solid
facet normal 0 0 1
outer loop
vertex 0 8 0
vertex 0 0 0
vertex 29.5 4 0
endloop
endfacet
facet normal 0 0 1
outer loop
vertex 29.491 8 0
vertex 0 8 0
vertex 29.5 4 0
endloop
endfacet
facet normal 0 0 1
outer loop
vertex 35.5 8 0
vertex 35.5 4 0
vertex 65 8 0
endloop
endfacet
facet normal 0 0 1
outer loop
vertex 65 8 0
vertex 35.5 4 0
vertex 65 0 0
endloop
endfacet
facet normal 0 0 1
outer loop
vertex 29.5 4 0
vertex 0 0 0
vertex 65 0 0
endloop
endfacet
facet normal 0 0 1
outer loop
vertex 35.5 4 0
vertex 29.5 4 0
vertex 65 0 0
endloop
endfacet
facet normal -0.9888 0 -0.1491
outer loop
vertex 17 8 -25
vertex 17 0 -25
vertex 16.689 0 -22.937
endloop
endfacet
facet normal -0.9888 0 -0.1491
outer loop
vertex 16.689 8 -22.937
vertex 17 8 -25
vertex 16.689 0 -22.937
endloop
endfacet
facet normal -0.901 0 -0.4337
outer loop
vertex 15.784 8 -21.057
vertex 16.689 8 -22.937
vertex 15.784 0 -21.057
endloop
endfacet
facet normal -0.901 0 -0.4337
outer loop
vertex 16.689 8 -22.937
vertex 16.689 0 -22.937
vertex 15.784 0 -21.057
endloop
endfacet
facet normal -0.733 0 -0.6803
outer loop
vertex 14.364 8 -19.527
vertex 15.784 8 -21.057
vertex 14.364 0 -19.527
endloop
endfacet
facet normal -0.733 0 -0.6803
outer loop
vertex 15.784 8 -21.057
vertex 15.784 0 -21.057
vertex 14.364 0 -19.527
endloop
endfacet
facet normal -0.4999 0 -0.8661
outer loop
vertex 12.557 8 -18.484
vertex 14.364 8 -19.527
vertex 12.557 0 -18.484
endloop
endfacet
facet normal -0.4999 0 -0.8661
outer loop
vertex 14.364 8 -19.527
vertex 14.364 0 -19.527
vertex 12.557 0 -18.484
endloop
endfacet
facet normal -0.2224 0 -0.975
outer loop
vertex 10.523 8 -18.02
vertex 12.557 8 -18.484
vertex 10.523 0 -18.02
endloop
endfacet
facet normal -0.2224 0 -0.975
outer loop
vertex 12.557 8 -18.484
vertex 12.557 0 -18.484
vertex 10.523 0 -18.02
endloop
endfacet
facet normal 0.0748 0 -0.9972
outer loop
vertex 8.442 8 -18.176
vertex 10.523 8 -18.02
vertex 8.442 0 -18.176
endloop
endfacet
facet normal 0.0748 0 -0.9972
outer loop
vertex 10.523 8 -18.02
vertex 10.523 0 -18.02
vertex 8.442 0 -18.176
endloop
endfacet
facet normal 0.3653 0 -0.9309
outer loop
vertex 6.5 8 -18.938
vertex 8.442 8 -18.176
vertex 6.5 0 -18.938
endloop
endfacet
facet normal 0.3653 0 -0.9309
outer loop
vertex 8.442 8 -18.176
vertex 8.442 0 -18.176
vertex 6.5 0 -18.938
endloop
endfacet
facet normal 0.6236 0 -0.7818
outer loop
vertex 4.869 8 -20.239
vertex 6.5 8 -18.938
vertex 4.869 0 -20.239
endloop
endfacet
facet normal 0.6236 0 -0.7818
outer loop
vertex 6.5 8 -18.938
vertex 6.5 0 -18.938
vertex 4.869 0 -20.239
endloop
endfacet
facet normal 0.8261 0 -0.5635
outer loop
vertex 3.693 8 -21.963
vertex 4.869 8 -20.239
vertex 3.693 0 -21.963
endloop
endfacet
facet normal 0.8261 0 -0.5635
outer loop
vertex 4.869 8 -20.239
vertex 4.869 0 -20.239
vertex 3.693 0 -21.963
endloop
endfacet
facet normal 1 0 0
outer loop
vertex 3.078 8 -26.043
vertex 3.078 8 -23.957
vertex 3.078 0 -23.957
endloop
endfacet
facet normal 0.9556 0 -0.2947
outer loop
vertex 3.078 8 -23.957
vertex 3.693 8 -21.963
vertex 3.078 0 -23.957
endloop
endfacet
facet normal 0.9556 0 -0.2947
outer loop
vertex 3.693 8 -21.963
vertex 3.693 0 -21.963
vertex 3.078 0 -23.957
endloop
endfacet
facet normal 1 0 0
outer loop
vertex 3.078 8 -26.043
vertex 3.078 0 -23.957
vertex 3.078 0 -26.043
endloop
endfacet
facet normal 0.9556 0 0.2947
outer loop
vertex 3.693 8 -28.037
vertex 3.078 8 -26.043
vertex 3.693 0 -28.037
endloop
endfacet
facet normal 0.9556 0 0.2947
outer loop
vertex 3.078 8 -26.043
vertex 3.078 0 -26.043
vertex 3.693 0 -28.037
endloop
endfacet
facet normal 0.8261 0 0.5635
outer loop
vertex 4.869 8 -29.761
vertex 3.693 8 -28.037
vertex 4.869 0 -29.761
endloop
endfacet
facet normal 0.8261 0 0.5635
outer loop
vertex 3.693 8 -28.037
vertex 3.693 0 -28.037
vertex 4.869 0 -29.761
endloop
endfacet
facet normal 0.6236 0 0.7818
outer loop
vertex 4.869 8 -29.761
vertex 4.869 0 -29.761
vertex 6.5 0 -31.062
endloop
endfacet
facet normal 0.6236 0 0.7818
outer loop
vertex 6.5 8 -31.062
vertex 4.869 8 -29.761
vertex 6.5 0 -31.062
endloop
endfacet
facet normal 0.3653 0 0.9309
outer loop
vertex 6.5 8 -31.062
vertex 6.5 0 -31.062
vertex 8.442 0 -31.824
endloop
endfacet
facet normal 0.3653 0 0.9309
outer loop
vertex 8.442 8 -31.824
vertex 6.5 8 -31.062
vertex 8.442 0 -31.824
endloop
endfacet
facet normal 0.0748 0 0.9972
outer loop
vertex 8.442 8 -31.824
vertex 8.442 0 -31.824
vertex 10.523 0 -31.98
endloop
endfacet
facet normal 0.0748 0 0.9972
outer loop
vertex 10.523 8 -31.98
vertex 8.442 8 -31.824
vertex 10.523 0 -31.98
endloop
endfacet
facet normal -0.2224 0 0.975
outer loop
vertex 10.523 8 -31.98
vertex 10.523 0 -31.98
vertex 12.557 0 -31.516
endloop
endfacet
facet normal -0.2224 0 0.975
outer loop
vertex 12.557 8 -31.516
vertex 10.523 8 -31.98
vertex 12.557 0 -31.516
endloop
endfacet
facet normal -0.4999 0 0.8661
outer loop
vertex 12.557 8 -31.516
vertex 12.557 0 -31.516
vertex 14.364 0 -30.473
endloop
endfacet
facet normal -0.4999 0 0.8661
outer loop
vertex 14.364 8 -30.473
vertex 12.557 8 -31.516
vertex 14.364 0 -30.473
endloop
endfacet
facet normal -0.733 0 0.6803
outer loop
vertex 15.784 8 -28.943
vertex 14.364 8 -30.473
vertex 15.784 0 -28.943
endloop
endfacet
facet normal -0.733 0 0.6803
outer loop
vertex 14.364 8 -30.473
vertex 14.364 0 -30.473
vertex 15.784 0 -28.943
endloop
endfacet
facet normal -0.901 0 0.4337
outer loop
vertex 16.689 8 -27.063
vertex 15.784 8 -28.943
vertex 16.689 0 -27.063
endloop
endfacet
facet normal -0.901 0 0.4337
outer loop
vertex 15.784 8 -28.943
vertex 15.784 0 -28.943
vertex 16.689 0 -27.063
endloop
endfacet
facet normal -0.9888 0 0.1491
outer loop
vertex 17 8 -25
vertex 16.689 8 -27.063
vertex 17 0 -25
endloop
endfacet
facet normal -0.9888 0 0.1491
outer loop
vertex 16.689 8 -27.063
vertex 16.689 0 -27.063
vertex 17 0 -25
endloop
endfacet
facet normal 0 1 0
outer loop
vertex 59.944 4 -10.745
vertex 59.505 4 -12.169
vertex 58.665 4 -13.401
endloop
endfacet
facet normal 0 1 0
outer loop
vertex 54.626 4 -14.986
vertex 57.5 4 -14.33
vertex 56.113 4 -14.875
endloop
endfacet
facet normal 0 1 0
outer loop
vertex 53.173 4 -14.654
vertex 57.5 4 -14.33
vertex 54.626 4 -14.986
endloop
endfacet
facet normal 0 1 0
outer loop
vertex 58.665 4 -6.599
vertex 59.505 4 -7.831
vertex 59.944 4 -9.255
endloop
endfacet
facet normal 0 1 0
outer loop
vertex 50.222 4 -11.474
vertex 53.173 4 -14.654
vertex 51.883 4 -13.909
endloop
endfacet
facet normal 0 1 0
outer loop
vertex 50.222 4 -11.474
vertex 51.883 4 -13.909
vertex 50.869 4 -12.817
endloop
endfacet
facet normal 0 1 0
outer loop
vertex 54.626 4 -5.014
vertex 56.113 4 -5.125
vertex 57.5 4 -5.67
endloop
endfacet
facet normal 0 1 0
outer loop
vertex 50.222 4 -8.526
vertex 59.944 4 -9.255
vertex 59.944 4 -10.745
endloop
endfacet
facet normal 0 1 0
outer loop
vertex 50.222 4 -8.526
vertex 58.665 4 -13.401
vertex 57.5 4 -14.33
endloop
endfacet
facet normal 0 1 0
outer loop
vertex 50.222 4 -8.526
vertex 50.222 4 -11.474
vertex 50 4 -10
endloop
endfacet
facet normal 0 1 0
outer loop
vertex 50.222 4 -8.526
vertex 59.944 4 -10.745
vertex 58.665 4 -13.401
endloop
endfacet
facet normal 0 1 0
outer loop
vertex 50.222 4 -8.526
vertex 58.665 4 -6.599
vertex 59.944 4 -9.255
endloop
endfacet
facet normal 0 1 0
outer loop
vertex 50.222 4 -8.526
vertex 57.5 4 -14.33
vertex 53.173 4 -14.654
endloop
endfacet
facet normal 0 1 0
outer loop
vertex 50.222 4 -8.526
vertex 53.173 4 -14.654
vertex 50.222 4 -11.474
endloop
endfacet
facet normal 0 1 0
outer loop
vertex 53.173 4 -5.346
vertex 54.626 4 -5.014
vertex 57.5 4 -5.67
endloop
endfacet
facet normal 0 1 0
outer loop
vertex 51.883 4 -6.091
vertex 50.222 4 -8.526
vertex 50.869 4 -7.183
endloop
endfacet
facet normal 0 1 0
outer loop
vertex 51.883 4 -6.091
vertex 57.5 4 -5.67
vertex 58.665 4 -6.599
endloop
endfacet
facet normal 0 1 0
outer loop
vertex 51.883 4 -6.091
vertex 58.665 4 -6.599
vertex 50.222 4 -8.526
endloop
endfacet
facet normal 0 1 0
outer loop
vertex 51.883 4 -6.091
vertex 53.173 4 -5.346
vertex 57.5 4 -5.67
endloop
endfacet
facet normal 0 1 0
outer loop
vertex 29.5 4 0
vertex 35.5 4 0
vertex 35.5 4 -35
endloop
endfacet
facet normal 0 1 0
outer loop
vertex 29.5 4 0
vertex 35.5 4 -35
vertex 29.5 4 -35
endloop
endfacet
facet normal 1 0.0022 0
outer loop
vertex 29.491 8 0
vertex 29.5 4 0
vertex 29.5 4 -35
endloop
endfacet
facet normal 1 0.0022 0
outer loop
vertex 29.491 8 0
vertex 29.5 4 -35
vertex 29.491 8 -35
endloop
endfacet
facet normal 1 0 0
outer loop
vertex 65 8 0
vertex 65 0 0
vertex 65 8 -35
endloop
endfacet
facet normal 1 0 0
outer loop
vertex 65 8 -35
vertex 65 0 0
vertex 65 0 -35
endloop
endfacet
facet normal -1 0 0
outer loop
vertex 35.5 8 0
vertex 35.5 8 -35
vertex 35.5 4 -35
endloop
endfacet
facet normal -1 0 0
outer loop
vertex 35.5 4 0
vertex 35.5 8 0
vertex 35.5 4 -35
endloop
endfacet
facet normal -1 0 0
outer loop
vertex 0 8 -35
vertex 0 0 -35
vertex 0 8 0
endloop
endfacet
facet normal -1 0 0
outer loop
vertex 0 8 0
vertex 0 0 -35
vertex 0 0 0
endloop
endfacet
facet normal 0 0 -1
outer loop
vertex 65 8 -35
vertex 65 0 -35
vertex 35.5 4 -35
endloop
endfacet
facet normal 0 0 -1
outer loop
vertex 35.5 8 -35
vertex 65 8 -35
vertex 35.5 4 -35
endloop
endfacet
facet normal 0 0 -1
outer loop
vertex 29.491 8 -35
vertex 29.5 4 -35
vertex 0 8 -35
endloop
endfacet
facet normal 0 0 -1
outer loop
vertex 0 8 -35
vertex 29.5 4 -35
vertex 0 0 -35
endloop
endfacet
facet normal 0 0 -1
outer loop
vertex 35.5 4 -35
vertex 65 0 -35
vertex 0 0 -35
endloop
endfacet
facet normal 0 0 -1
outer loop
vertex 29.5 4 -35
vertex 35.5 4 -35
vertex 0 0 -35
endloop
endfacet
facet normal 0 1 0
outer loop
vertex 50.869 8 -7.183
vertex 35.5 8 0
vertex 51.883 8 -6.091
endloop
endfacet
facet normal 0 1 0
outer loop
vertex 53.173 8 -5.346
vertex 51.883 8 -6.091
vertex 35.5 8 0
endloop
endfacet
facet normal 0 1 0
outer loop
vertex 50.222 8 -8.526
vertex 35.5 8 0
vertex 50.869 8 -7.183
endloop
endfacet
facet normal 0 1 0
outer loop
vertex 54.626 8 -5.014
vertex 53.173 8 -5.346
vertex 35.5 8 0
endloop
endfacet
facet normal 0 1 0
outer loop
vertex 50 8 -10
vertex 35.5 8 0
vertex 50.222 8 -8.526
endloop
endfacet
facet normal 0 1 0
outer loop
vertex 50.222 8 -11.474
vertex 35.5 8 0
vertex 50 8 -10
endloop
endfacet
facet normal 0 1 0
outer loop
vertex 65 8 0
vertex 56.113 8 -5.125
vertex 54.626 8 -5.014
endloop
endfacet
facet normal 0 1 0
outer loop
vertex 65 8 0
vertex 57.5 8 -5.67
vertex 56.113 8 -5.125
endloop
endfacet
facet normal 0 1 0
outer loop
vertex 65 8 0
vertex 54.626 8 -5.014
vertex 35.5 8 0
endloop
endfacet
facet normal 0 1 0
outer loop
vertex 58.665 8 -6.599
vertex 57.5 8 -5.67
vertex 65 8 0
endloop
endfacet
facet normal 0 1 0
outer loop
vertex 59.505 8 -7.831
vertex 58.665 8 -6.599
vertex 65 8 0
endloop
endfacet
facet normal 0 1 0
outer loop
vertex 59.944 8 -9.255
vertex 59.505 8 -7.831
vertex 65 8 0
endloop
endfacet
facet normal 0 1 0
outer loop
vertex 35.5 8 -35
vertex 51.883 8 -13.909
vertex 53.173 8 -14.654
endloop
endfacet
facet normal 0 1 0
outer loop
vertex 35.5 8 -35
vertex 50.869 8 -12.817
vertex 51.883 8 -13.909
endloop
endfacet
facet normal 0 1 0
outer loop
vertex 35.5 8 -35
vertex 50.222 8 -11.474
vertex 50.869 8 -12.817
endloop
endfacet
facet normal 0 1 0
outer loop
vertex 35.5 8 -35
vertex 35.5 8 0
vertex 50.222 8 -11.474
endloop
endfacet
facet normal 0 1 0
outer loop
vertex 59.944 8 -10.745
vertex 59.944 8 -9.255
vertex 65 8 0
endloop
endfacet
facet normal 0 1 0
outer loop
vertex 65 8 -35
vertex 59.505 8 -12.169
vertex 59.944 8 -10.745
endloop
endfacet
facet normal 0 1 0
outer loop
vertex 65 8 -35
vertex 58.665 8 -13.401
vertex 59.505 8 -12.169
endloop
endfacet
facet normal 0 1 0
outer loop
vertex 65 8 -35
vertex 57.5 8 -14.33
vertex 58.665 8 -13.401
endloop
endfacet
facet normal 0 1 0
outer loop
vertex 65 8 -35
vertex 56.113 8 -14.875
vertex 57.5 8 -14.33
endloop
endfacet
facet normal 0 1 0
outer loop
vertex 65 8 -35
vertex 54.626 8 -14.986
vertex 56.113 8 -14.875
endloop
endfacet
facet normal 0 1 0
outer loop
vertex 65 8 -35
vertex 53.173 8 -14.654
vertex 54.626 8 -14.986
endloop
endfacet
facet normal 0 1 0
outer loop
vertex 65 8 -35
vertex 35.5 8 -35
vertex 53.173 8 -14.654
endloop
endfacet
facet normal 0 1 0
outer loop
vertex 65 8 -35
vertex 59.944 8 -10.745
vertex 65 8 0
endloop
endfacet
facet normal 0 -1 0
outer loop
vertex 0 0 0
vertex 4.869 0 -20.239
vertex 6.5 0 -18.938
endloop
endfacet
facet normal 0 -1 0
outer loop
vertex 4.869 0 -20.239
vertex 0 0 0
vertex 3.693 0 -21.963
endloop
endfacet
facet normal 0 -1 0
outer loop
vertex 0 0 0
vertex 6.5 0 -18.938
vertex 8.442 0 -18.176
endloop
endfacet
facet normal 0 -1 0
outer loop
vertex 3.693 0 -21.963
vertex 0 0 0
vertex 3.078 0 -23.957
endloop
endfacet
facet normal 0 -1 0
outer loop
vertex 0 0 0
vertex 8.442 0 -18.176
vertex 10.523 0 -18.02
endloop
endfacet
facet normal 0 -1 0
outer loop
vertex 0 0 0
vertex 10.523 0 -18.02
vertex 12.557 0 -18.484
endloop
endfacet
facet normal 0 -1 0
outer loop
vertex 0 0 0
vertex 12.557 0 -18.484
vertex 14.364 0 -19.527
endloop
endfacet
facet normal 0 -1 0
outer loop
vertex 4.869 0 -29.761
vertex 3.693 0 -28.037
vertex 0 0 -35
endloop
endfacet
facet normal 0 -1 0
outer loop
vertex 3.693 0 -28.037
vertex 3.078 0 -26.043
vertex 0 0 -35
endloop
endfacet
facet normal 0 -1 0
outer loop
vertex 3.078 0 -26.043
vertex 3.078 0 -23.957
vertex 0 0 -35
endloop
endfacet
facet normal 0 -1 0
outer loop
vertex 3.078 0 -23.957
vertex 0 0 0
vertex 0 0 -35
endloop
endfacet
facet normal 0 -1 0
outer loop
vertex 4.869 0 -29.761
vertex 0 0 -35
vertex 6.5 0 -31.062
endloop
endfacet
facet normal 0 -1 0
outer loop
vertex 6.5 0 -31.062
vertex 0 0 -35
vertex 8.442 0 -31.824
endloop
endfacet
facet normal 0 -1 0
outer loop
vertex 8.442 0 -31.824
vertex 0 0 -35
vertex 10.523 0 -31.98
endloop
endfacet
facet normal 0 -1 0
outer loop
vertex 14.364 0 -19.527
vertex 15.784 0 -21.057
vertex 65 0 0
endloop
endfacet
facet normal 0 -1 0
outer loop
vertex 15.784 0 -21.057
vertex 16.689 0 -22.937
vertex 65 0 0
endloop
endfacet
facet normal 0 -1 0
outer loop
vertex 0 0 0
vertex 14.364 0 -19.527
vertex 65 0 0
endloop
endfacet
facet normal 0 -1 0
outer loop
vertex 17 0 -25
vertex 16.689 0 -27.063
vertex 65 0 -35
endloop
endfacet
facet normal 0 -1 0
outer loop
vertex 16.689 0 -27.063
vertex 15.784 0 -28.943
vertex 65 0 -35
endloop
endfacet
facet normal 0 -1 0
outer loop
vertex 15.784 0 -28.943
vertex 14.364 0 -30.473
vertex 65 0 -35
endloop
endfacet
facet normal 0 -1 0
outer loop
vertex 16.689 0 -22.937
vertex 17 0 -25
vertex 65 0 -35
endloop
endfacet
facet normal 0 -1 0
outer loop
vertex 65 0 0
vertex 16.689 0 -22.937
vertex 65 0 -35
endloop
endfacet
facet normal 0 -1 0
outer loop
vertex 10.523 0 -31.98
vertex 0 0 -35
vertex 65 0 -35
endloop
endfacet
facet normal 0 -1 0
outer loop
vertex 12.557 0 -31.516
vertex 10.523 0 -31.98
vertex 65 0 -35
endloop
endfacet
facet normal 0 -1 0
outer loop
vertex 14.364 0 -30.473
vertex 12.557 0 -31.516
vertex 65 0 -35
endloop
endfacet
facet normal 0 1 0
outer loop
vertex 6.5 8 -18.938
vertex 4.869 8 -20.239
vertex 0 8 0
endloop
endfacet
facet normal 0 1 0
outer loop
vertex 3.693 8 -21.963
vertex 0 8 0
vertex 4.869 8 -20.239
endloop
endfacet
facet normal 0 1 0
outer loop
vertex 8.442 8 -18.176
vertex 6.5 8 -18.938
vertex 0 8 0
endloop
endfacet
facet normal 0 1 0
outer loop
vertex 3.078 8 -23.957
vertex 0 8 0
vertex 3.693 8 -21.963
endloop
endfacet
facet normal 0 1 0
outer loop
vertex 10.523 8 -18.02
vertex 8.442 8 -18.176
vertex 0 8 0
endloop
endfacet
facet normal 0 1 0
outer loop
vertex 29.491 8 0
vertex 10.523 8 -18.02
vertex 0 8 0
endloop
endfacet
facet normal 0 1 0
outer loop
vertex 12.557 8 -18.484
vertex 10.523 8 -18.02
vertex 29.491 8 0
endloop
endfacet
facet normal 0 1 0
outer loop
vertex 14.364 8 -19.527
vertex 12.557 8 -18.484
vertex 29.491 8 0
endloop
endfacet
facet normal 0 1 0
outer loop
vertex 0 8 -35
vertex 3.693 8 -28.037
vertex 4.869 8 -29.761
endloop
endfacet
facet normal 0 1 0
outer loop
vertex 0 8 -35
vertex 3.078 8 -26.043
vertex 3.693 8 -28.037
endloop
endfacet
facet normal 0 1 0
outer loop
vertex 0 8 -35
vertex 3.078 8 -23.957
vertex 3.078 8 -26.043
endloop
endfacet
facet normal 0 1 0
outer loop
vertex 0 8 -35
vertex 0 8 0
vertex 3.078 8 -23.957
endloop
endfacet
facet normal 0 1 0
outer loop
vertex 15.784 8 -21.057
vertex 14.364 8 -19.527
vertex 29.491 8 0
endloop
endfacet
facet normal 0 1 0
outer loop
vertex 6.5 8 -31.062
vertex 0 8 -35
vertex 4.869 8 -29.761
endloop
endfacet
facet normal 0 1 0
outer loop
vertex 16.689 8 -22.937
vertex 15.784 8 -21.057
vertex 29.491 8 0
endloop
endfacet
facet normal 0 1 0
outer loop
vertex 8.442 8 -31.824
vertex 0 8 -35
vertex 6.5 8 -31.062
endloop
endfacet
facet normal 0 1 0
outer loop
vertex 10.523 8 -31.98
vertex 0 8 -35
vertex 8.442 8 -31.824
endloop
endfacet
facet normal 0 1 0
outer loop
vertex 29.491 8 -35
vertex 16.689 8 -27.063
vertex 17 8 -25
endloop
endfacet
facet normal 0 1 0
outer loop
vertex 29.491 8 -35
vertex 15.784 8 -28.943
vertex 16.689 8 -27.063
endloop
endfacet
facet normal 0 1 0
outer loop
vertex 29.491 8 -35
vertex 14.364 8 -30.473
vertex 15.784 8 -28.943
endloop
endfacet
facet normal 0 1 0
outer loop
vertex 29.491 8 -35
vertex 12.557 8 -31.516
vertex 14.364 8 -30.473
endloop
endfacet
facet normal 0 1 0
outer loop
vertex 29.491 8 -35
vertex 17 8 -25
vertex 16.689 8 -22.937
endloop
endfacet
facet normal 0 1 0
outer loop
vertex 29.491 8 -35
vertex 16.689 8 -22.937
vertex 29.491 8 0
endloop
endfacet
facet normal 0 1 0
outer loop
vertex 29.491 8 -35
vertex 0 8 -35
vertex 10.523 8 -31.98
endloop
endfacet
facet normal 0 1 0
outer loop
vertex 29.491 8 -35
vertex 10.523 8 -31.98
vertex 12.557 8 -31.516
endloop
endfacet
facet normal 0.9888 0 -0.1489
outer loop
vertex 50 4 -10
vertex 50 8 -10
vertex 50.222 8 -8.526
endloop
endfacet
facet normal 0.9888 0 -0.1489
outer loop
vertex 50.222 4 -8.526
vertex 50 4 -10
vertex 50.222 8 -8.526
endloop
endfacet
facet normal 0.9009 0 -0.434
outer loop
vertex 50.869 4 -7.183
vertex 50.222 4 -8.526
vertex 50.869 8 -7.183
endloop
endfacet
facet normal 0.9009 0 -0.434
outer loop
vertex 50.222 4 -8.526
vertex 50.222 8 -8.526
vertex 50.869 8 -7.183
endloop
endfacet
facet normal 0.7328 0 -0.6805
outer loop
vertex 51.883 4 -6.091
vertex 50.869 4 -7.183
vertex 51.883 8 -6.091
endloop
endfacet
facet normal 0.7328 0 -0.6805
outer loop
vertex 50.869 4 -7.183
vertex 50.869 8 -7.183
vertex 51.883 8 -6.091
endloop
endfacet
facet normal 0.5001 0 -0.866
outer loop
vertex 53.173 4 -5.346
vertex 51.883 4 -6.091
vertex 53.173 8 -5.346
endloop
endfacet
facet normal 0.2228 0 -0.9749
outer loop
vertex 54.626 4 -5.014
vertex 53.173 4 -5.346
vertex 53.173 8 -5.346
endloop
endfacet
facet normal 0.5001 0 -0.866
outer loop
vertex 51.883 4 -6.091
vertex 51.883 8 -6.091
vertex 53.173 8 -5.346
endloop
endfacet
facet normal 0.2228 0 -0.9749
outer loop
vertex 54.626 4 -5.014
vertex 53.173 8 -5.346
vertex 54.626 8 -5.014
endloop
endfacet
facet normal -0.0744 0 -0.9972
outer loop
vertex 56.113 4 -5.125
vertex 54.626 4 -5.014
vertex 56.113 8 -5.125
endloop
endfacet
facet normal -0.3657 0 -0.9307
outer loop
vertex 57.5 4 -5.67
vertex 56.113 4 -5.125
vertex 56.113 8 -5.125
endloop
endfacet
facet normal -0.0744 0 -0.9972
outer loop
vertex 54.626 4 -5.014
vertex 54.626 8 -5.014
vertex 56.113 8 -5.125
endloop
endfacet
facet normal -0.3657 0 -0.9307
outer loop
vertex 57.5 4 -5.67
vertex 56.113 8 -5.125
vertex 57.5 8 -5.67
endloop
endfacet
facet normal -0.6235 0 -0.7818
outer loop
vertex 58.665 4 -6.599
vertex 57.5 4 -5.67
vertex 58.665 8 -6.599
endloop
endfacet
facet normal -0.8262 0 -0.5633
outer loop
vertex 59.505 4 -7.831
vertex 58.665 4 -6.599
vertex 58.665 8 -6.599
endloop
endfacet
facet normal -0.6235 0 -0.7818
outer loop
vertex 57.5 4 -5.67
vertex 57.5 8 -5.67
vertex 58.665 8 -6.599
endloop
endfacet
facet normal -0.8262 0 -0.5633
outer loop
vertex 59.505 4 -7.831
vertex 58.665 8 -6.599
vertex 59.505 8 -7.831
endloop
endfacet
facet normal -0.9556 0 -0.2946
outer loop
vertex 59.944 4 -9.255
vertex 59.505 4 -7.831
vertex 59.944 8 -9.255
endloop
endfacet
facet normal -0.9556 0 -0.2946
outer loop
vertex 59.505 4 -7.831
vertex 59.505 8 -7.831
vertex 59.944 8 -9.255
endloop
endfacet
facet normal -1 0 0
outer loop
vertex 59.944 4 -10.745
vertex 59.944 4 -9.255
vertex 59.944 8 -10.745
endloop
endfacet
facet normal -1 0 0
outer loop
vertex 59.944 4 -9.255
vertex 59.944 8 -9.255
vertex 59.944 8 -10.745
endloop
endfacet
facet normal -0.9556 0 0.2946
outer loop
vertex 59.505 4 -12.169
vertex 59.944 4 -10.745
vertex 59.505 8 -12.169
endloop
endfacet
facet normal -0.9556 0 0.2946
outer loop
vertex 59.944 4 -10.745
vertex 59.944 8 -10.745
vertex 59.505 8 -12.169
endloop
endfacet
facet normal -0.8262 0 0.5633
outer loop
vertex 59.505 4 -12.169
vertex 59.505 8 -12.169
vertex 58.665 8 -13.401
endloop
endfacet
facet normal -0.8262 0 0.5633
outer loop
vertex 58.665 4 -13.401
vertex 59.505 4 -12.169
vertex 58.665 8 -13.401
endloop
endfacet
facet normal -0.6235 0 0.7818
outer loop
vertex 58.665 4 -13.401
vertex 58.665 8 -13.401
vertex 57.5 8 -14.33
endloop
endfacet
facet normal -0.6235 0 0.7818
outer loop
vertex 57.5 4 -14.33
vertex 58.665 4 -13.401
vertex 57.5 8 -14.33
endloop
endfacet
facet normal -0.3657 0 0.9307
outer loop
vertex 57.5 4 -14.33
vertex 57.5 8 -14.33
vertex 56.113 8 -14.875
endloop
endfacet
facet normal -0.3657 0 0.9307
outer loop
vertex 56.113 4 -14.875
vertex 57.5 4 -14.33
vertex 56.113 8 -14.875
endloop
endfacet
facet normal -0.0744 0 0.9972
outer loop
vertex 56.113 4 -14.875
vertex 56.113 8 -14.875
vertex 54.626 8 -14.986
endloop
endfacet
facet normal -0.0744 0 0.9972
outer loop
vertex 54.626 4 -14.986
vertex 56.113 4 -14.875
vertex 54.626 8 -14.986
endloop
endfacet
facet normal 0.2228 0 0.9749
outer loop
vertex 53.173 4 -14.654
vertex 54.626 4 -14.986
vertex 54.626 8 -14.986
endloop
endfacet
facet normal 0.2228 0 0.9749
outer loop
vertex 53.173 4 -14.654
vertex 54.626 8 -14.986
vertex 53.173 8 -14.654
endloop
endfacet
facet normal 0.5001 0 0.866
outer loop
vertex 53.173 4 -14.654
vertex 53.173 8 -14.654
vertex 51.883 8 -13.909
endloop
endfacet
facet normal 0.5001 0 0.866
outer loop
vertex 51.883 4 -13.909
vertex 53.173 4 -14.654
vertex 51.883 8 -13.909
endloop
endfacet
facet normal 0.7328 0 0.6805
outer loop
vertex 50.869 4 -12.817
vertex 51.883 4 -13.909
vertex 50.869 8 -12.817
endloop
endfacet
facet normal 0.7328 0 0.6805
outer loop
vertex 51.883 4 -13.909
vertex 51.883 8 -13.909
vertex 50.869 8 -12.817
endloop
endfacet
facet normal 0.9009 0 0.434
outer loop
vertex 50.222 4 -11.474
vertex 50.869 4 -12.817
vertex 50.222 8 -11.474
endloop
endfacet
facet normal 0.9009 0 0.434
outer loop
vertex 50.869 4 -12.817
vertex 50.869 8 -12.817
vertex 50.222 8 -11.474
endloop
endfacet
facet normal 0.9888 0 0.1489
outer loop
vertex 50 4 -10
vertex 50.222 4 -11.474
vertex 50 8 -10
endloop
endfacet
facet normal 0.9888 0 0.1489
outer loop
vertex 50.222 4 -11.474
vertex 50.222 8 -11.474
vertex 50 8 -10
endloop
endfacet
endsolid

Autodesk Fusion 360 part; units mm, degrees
sketch "Sketch1" plane through (0, 0, 0) normal (0, 1, 0) x (1, 0, 0)
  line L0 (0, 0) -> (65, 0)
  line L1 (65, 0) -> (65, 35)
  line L2 (65, 35) -> (0, 35)
  line L3 (0, 35) -> (0, 0)
  line L4 (10, 35) -> (10, 25) construction
  circle A0 centre (10, 25) radius 7
  dimension "d1" = 35
  dimension "d2" = 65
  dimension "d3" = 14
extrude "Extrude1" add sketch "Sketch1" along normal blind 8
sketch "Sketch2" plane through (0, 8, 0) normal (0, 1, 0) x (-1, 0, 0)
  circle A0 centre (-10, -25) radius 7
  line L0 (0, -35) -> (0, 0)
  line L1 (0, 0) -> (-65, 0)
  line L2 (-65, 0) -> (-65, -35)
  line L3 (-65, -35) -> (0, -35)
  circle A1 centre (-55, -10) radius 5
  dimension "d6" = 10
extrude "Extrude2" cut sketch "Sketch2" against normal blind 4 contours A1
sketch "Sketch3" plane through (0, 0, 0) normal (0, 0, 1) x (1, 0, 0)
  line L0 (0, 0) -> (65, 0)
  line L1 (65, 0) -> (65, 8)
  line L2 (65, 8) -> (0, 8)
  line L3 (0, 8) -> (0, 0)
  line L4 (32.5, 8) -> (35.5, 8)
  line L5 (35.5, 8) -> (35.5, 4)
  line L6 (35.5, 4) -> (29.5, 4)
  line L7 (29.5, 4) -> (29.4914, 8)
  line L8 (32.5, 8) -> (29.4914, 8)
  dimension "d9" = 3
  dimension "d10" = 4
  dimension "d11" = 6
extrude "Extrude3" cut sketch "Sketch3" against normal blind 35 contours L2 L4 L5 L6 L7 L8
